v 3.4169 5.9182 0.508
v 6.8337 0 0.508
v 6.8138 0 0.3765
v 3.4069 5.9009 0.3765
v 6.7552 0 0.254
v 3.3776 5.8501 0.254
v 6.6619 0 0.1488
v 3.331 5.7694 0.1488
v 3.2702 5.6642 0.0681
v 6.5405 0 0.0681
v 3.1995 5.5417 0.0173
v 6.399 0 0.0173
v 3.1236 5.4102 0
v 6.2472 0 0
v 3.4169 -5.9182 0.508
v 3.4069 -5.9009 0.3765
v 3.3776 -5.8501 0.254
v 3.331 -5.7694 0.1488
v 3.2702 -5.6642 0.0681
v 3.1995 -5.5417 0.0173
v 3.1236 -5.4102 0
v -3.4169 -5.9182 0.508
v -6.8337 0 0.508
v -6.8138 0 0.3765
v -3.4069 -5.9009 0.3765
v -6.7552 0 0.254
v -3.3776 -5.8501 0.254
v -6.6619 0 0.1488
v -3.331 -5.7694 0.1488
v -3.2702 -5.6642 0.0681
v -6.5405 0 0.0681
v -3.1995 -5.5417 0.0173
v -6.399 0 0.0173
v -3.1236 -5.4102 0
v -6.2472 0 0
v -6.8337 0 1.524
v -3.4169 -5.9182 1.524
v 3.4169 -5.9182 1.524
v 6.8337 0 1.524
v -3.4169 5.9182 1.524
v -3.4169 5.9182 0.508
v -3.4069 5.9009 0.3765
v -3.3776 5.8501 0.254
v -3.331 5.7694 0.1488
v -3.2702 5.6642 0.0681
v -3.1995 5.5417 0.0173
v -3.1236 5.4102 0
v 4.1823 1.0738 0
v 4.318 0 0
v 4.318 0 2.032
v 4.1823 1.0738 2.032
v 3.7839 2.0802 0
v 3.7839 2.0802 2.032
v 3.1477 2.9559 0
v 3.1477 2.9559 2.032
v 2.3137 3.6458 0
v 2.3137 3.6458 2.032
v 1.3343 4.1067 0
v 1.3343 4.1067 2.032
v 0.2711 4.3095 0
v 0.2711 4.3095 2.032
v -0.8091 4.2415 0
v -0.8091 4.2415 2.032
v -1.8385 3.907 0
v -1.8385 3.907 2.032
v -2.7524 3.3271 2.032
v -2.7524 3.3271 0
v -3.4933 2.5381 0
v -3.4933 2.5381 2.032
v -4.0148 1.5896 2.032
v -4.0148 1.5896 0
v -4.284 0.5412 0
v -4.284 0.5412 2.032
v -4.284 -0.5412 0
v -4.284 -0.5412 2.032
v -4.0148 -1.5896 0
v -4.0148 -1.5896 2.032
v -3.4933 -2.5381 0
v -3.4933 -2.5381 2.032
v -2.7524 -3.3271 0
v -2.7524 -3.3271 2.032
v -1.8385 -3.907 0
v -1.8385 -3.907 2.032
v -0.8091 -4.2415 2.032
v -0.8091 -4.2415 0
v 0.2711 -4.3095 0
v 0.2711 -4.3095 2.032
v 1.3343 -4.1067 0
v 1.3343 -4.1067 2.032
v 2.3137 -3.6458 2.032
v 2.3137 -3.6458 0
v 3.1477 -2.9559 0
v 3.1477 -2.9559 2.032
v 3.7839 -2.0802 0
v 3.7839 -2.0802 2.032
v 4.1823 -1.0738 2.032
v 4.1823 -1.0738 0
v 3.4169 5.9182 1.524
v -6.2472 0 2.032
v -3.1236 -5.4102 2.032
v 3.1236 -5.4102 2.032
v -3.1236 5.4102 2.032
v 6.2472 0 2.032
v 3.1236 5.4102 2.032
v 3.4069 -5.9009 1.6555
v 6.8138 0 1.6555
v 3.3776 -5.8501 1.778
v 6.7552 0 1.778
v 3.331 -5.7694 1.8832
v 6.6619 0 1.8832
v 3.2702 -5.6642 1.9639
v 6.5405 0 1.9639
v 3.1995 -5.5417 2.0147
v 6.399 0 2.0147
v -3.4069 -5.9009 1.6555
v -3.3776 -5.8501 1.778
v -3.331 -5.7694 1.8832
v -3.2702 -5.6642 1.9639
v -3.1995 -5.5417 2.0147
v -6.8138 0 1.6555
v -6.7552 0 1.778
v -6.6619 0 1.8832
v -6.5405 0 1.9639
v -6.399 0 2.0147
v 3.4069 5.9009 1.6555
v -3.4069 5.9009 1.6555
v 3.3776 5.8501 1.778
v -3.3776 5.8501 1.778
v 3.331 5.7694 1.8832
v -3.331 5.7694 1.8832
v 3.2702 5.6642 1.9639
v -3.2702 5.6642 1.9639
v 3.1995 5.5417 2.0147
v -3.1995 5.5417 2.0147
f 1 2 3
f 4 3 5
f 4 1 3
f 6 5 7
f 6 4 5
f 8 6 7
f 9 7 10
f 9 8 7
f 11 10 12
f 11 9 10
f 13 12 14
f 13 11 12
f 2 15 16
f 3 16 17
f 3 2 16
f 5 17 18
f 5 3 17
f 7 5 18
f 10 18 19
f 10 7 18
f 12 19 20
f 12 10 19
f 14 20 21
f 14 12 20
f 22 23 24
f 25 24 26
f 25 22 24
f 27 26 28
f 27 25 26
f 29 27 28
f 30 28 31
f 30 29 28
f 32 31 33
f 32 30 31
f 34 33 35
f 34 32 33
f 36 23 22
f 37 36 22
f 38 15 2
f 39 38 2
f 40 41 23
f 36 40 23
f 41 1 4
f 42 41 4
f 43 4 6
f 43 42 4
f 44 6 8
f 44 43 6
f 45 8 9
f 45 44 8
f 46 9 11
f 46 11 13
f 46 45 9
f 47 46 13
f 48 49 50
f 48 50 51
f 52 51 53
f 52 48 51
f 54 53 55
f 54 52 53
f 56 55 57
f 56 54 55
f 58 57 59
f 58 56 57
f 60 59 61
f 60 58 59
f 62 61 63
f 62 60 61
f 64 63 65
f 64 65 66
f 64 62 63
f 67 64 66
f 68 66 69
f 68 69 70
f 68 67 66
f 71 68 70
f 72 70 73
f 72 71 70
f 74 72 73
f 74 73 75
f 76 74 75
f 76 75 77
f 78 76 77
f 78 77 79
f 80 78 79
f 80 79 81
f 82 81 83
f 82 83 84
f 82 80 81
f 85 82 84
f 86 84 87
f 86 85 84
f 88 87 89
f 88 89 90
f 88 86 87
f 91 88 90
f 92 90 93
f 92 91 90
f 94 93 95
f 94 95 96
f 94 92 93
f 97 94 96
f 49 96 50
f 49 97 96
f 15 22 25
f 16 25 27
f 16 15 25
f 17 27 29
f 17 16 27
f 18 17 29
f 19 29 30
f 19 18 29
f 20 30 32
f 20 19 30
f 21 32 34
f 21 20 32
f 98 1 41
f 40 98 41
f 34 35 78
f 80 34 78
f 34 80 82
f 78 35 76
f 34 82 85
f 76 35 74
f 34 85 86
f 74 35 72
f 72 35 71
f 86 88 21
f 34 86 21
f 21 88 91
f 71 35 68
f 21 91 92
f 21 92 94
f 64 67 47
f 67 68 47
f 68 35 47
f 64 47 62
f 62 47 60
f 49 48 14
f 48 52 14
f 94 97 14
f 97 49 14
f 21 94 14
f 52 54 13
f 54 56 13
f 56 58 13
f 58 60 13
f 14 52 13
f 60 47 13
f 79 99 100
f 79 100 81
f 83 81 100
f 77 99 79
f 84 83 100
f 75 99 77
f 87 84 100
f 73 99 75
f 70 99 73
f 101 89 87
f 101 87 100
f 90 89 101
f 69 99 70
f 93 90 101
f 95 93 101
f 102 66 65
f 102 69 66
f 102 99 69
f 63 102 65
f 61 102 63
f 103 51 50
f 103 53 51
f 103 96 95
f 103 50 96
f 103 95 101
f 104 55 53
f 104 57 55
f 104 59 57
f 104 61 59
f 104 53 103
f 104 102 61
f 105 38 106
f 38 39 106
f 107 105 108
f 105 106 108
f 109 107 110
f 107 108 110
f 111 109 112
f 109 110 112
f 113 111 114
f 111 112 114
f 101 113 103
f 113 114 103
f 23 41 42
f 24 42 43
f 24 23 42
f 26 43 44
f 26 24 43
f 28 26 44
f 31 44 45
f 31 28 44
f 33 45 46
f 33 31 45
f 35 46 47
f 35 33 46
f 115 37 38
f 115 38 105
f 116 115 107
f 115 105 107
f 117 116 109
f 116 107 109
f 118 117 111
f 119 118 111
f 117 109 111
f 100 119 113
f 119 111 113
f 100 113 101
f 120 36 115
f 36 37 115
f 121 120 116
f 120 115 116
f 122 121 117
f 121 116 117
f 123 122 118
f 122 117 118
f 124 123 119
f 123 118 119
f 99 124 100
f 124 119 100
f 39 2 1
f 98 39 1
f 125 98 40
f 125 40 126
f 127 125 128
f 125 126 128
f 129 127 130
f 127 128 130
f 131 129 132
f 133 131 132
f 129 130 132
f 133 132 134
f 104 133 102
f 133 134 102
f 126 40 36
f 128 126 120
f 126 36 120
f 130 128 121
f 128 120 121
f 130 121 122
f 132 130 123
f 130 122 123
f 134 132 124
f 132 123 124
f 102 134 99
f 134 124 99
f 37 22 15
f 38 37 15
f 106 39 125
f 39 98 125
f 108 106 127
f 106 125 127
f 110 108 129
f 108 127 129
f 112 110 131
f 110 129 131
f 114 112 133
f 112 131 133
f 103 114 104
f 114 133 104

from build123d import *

# Parameters (mm, degrees)
SKETCH1_R      = 4.317999999999999
EXTRUDE1_DEPTH = 2.032
FILLET1_R      = 0.508


with BuildPart() as part:
    # Sketch1 → Extrude1 (new body)
    with BuildSketch(Plane.XY):
        Polygon((-5.125311544677072, 2.9590999999999883), (-6.833748726236091, -2.364e-14), (-5.125311544677051, -2.959100000000024), (-3.4168743631180254, -5.918200000000001), (0, -5.918200000000001), (3.4168743631180534, -5.918200000000001), (5.125311544677072, -2.9590999999999883), (6.833748726236091, 2.45e-14), (5.125311544677051, 2.959100000000024), (3.4168743631180254, 5.918200000000001), (0, 5.918200000000001), (-3.4168743631180534, 5.918200000000001), align=None)
        Circle(SKETCH1_R, mode=Mode.SUBTRACT)
    extrude(amount=EXTRUDE1_DEPTH)

    # Fillet1
    fillet1_edges = [part.edges().sort_by_distance(p)[0] for p in [
        (-5.125311544677058, -2.9591000000000123, 2.032),
        (-1.421e-14, 5.918200000000001, 0),
        (5.125311544677058, 2.9591000000000123, 0),
        (5.125311544677072, -2.959099999999988, 0),
        (1.421e-14, -5.918200000000001, 0),
        (-5.125311544677058, -2.959100000000012, 0),
        (-5.125311544677072, 2.9590999999999883, 0),
        (1.377e-14, -5.918200000000001, 2.032),
        (5.125311544677072, -2.9590999999999883, 2.032),
        (5.125311544677058, 2.9591000000000127, 2.032),
        (-1.377e-14, 5.918200000000001, 2.032),
        (-5.125311544677072, 2.9590999999999887, 2.032),
    ]]
    fillet(fillet1_edges, radius=FILLET1_R)


solid = part.part
